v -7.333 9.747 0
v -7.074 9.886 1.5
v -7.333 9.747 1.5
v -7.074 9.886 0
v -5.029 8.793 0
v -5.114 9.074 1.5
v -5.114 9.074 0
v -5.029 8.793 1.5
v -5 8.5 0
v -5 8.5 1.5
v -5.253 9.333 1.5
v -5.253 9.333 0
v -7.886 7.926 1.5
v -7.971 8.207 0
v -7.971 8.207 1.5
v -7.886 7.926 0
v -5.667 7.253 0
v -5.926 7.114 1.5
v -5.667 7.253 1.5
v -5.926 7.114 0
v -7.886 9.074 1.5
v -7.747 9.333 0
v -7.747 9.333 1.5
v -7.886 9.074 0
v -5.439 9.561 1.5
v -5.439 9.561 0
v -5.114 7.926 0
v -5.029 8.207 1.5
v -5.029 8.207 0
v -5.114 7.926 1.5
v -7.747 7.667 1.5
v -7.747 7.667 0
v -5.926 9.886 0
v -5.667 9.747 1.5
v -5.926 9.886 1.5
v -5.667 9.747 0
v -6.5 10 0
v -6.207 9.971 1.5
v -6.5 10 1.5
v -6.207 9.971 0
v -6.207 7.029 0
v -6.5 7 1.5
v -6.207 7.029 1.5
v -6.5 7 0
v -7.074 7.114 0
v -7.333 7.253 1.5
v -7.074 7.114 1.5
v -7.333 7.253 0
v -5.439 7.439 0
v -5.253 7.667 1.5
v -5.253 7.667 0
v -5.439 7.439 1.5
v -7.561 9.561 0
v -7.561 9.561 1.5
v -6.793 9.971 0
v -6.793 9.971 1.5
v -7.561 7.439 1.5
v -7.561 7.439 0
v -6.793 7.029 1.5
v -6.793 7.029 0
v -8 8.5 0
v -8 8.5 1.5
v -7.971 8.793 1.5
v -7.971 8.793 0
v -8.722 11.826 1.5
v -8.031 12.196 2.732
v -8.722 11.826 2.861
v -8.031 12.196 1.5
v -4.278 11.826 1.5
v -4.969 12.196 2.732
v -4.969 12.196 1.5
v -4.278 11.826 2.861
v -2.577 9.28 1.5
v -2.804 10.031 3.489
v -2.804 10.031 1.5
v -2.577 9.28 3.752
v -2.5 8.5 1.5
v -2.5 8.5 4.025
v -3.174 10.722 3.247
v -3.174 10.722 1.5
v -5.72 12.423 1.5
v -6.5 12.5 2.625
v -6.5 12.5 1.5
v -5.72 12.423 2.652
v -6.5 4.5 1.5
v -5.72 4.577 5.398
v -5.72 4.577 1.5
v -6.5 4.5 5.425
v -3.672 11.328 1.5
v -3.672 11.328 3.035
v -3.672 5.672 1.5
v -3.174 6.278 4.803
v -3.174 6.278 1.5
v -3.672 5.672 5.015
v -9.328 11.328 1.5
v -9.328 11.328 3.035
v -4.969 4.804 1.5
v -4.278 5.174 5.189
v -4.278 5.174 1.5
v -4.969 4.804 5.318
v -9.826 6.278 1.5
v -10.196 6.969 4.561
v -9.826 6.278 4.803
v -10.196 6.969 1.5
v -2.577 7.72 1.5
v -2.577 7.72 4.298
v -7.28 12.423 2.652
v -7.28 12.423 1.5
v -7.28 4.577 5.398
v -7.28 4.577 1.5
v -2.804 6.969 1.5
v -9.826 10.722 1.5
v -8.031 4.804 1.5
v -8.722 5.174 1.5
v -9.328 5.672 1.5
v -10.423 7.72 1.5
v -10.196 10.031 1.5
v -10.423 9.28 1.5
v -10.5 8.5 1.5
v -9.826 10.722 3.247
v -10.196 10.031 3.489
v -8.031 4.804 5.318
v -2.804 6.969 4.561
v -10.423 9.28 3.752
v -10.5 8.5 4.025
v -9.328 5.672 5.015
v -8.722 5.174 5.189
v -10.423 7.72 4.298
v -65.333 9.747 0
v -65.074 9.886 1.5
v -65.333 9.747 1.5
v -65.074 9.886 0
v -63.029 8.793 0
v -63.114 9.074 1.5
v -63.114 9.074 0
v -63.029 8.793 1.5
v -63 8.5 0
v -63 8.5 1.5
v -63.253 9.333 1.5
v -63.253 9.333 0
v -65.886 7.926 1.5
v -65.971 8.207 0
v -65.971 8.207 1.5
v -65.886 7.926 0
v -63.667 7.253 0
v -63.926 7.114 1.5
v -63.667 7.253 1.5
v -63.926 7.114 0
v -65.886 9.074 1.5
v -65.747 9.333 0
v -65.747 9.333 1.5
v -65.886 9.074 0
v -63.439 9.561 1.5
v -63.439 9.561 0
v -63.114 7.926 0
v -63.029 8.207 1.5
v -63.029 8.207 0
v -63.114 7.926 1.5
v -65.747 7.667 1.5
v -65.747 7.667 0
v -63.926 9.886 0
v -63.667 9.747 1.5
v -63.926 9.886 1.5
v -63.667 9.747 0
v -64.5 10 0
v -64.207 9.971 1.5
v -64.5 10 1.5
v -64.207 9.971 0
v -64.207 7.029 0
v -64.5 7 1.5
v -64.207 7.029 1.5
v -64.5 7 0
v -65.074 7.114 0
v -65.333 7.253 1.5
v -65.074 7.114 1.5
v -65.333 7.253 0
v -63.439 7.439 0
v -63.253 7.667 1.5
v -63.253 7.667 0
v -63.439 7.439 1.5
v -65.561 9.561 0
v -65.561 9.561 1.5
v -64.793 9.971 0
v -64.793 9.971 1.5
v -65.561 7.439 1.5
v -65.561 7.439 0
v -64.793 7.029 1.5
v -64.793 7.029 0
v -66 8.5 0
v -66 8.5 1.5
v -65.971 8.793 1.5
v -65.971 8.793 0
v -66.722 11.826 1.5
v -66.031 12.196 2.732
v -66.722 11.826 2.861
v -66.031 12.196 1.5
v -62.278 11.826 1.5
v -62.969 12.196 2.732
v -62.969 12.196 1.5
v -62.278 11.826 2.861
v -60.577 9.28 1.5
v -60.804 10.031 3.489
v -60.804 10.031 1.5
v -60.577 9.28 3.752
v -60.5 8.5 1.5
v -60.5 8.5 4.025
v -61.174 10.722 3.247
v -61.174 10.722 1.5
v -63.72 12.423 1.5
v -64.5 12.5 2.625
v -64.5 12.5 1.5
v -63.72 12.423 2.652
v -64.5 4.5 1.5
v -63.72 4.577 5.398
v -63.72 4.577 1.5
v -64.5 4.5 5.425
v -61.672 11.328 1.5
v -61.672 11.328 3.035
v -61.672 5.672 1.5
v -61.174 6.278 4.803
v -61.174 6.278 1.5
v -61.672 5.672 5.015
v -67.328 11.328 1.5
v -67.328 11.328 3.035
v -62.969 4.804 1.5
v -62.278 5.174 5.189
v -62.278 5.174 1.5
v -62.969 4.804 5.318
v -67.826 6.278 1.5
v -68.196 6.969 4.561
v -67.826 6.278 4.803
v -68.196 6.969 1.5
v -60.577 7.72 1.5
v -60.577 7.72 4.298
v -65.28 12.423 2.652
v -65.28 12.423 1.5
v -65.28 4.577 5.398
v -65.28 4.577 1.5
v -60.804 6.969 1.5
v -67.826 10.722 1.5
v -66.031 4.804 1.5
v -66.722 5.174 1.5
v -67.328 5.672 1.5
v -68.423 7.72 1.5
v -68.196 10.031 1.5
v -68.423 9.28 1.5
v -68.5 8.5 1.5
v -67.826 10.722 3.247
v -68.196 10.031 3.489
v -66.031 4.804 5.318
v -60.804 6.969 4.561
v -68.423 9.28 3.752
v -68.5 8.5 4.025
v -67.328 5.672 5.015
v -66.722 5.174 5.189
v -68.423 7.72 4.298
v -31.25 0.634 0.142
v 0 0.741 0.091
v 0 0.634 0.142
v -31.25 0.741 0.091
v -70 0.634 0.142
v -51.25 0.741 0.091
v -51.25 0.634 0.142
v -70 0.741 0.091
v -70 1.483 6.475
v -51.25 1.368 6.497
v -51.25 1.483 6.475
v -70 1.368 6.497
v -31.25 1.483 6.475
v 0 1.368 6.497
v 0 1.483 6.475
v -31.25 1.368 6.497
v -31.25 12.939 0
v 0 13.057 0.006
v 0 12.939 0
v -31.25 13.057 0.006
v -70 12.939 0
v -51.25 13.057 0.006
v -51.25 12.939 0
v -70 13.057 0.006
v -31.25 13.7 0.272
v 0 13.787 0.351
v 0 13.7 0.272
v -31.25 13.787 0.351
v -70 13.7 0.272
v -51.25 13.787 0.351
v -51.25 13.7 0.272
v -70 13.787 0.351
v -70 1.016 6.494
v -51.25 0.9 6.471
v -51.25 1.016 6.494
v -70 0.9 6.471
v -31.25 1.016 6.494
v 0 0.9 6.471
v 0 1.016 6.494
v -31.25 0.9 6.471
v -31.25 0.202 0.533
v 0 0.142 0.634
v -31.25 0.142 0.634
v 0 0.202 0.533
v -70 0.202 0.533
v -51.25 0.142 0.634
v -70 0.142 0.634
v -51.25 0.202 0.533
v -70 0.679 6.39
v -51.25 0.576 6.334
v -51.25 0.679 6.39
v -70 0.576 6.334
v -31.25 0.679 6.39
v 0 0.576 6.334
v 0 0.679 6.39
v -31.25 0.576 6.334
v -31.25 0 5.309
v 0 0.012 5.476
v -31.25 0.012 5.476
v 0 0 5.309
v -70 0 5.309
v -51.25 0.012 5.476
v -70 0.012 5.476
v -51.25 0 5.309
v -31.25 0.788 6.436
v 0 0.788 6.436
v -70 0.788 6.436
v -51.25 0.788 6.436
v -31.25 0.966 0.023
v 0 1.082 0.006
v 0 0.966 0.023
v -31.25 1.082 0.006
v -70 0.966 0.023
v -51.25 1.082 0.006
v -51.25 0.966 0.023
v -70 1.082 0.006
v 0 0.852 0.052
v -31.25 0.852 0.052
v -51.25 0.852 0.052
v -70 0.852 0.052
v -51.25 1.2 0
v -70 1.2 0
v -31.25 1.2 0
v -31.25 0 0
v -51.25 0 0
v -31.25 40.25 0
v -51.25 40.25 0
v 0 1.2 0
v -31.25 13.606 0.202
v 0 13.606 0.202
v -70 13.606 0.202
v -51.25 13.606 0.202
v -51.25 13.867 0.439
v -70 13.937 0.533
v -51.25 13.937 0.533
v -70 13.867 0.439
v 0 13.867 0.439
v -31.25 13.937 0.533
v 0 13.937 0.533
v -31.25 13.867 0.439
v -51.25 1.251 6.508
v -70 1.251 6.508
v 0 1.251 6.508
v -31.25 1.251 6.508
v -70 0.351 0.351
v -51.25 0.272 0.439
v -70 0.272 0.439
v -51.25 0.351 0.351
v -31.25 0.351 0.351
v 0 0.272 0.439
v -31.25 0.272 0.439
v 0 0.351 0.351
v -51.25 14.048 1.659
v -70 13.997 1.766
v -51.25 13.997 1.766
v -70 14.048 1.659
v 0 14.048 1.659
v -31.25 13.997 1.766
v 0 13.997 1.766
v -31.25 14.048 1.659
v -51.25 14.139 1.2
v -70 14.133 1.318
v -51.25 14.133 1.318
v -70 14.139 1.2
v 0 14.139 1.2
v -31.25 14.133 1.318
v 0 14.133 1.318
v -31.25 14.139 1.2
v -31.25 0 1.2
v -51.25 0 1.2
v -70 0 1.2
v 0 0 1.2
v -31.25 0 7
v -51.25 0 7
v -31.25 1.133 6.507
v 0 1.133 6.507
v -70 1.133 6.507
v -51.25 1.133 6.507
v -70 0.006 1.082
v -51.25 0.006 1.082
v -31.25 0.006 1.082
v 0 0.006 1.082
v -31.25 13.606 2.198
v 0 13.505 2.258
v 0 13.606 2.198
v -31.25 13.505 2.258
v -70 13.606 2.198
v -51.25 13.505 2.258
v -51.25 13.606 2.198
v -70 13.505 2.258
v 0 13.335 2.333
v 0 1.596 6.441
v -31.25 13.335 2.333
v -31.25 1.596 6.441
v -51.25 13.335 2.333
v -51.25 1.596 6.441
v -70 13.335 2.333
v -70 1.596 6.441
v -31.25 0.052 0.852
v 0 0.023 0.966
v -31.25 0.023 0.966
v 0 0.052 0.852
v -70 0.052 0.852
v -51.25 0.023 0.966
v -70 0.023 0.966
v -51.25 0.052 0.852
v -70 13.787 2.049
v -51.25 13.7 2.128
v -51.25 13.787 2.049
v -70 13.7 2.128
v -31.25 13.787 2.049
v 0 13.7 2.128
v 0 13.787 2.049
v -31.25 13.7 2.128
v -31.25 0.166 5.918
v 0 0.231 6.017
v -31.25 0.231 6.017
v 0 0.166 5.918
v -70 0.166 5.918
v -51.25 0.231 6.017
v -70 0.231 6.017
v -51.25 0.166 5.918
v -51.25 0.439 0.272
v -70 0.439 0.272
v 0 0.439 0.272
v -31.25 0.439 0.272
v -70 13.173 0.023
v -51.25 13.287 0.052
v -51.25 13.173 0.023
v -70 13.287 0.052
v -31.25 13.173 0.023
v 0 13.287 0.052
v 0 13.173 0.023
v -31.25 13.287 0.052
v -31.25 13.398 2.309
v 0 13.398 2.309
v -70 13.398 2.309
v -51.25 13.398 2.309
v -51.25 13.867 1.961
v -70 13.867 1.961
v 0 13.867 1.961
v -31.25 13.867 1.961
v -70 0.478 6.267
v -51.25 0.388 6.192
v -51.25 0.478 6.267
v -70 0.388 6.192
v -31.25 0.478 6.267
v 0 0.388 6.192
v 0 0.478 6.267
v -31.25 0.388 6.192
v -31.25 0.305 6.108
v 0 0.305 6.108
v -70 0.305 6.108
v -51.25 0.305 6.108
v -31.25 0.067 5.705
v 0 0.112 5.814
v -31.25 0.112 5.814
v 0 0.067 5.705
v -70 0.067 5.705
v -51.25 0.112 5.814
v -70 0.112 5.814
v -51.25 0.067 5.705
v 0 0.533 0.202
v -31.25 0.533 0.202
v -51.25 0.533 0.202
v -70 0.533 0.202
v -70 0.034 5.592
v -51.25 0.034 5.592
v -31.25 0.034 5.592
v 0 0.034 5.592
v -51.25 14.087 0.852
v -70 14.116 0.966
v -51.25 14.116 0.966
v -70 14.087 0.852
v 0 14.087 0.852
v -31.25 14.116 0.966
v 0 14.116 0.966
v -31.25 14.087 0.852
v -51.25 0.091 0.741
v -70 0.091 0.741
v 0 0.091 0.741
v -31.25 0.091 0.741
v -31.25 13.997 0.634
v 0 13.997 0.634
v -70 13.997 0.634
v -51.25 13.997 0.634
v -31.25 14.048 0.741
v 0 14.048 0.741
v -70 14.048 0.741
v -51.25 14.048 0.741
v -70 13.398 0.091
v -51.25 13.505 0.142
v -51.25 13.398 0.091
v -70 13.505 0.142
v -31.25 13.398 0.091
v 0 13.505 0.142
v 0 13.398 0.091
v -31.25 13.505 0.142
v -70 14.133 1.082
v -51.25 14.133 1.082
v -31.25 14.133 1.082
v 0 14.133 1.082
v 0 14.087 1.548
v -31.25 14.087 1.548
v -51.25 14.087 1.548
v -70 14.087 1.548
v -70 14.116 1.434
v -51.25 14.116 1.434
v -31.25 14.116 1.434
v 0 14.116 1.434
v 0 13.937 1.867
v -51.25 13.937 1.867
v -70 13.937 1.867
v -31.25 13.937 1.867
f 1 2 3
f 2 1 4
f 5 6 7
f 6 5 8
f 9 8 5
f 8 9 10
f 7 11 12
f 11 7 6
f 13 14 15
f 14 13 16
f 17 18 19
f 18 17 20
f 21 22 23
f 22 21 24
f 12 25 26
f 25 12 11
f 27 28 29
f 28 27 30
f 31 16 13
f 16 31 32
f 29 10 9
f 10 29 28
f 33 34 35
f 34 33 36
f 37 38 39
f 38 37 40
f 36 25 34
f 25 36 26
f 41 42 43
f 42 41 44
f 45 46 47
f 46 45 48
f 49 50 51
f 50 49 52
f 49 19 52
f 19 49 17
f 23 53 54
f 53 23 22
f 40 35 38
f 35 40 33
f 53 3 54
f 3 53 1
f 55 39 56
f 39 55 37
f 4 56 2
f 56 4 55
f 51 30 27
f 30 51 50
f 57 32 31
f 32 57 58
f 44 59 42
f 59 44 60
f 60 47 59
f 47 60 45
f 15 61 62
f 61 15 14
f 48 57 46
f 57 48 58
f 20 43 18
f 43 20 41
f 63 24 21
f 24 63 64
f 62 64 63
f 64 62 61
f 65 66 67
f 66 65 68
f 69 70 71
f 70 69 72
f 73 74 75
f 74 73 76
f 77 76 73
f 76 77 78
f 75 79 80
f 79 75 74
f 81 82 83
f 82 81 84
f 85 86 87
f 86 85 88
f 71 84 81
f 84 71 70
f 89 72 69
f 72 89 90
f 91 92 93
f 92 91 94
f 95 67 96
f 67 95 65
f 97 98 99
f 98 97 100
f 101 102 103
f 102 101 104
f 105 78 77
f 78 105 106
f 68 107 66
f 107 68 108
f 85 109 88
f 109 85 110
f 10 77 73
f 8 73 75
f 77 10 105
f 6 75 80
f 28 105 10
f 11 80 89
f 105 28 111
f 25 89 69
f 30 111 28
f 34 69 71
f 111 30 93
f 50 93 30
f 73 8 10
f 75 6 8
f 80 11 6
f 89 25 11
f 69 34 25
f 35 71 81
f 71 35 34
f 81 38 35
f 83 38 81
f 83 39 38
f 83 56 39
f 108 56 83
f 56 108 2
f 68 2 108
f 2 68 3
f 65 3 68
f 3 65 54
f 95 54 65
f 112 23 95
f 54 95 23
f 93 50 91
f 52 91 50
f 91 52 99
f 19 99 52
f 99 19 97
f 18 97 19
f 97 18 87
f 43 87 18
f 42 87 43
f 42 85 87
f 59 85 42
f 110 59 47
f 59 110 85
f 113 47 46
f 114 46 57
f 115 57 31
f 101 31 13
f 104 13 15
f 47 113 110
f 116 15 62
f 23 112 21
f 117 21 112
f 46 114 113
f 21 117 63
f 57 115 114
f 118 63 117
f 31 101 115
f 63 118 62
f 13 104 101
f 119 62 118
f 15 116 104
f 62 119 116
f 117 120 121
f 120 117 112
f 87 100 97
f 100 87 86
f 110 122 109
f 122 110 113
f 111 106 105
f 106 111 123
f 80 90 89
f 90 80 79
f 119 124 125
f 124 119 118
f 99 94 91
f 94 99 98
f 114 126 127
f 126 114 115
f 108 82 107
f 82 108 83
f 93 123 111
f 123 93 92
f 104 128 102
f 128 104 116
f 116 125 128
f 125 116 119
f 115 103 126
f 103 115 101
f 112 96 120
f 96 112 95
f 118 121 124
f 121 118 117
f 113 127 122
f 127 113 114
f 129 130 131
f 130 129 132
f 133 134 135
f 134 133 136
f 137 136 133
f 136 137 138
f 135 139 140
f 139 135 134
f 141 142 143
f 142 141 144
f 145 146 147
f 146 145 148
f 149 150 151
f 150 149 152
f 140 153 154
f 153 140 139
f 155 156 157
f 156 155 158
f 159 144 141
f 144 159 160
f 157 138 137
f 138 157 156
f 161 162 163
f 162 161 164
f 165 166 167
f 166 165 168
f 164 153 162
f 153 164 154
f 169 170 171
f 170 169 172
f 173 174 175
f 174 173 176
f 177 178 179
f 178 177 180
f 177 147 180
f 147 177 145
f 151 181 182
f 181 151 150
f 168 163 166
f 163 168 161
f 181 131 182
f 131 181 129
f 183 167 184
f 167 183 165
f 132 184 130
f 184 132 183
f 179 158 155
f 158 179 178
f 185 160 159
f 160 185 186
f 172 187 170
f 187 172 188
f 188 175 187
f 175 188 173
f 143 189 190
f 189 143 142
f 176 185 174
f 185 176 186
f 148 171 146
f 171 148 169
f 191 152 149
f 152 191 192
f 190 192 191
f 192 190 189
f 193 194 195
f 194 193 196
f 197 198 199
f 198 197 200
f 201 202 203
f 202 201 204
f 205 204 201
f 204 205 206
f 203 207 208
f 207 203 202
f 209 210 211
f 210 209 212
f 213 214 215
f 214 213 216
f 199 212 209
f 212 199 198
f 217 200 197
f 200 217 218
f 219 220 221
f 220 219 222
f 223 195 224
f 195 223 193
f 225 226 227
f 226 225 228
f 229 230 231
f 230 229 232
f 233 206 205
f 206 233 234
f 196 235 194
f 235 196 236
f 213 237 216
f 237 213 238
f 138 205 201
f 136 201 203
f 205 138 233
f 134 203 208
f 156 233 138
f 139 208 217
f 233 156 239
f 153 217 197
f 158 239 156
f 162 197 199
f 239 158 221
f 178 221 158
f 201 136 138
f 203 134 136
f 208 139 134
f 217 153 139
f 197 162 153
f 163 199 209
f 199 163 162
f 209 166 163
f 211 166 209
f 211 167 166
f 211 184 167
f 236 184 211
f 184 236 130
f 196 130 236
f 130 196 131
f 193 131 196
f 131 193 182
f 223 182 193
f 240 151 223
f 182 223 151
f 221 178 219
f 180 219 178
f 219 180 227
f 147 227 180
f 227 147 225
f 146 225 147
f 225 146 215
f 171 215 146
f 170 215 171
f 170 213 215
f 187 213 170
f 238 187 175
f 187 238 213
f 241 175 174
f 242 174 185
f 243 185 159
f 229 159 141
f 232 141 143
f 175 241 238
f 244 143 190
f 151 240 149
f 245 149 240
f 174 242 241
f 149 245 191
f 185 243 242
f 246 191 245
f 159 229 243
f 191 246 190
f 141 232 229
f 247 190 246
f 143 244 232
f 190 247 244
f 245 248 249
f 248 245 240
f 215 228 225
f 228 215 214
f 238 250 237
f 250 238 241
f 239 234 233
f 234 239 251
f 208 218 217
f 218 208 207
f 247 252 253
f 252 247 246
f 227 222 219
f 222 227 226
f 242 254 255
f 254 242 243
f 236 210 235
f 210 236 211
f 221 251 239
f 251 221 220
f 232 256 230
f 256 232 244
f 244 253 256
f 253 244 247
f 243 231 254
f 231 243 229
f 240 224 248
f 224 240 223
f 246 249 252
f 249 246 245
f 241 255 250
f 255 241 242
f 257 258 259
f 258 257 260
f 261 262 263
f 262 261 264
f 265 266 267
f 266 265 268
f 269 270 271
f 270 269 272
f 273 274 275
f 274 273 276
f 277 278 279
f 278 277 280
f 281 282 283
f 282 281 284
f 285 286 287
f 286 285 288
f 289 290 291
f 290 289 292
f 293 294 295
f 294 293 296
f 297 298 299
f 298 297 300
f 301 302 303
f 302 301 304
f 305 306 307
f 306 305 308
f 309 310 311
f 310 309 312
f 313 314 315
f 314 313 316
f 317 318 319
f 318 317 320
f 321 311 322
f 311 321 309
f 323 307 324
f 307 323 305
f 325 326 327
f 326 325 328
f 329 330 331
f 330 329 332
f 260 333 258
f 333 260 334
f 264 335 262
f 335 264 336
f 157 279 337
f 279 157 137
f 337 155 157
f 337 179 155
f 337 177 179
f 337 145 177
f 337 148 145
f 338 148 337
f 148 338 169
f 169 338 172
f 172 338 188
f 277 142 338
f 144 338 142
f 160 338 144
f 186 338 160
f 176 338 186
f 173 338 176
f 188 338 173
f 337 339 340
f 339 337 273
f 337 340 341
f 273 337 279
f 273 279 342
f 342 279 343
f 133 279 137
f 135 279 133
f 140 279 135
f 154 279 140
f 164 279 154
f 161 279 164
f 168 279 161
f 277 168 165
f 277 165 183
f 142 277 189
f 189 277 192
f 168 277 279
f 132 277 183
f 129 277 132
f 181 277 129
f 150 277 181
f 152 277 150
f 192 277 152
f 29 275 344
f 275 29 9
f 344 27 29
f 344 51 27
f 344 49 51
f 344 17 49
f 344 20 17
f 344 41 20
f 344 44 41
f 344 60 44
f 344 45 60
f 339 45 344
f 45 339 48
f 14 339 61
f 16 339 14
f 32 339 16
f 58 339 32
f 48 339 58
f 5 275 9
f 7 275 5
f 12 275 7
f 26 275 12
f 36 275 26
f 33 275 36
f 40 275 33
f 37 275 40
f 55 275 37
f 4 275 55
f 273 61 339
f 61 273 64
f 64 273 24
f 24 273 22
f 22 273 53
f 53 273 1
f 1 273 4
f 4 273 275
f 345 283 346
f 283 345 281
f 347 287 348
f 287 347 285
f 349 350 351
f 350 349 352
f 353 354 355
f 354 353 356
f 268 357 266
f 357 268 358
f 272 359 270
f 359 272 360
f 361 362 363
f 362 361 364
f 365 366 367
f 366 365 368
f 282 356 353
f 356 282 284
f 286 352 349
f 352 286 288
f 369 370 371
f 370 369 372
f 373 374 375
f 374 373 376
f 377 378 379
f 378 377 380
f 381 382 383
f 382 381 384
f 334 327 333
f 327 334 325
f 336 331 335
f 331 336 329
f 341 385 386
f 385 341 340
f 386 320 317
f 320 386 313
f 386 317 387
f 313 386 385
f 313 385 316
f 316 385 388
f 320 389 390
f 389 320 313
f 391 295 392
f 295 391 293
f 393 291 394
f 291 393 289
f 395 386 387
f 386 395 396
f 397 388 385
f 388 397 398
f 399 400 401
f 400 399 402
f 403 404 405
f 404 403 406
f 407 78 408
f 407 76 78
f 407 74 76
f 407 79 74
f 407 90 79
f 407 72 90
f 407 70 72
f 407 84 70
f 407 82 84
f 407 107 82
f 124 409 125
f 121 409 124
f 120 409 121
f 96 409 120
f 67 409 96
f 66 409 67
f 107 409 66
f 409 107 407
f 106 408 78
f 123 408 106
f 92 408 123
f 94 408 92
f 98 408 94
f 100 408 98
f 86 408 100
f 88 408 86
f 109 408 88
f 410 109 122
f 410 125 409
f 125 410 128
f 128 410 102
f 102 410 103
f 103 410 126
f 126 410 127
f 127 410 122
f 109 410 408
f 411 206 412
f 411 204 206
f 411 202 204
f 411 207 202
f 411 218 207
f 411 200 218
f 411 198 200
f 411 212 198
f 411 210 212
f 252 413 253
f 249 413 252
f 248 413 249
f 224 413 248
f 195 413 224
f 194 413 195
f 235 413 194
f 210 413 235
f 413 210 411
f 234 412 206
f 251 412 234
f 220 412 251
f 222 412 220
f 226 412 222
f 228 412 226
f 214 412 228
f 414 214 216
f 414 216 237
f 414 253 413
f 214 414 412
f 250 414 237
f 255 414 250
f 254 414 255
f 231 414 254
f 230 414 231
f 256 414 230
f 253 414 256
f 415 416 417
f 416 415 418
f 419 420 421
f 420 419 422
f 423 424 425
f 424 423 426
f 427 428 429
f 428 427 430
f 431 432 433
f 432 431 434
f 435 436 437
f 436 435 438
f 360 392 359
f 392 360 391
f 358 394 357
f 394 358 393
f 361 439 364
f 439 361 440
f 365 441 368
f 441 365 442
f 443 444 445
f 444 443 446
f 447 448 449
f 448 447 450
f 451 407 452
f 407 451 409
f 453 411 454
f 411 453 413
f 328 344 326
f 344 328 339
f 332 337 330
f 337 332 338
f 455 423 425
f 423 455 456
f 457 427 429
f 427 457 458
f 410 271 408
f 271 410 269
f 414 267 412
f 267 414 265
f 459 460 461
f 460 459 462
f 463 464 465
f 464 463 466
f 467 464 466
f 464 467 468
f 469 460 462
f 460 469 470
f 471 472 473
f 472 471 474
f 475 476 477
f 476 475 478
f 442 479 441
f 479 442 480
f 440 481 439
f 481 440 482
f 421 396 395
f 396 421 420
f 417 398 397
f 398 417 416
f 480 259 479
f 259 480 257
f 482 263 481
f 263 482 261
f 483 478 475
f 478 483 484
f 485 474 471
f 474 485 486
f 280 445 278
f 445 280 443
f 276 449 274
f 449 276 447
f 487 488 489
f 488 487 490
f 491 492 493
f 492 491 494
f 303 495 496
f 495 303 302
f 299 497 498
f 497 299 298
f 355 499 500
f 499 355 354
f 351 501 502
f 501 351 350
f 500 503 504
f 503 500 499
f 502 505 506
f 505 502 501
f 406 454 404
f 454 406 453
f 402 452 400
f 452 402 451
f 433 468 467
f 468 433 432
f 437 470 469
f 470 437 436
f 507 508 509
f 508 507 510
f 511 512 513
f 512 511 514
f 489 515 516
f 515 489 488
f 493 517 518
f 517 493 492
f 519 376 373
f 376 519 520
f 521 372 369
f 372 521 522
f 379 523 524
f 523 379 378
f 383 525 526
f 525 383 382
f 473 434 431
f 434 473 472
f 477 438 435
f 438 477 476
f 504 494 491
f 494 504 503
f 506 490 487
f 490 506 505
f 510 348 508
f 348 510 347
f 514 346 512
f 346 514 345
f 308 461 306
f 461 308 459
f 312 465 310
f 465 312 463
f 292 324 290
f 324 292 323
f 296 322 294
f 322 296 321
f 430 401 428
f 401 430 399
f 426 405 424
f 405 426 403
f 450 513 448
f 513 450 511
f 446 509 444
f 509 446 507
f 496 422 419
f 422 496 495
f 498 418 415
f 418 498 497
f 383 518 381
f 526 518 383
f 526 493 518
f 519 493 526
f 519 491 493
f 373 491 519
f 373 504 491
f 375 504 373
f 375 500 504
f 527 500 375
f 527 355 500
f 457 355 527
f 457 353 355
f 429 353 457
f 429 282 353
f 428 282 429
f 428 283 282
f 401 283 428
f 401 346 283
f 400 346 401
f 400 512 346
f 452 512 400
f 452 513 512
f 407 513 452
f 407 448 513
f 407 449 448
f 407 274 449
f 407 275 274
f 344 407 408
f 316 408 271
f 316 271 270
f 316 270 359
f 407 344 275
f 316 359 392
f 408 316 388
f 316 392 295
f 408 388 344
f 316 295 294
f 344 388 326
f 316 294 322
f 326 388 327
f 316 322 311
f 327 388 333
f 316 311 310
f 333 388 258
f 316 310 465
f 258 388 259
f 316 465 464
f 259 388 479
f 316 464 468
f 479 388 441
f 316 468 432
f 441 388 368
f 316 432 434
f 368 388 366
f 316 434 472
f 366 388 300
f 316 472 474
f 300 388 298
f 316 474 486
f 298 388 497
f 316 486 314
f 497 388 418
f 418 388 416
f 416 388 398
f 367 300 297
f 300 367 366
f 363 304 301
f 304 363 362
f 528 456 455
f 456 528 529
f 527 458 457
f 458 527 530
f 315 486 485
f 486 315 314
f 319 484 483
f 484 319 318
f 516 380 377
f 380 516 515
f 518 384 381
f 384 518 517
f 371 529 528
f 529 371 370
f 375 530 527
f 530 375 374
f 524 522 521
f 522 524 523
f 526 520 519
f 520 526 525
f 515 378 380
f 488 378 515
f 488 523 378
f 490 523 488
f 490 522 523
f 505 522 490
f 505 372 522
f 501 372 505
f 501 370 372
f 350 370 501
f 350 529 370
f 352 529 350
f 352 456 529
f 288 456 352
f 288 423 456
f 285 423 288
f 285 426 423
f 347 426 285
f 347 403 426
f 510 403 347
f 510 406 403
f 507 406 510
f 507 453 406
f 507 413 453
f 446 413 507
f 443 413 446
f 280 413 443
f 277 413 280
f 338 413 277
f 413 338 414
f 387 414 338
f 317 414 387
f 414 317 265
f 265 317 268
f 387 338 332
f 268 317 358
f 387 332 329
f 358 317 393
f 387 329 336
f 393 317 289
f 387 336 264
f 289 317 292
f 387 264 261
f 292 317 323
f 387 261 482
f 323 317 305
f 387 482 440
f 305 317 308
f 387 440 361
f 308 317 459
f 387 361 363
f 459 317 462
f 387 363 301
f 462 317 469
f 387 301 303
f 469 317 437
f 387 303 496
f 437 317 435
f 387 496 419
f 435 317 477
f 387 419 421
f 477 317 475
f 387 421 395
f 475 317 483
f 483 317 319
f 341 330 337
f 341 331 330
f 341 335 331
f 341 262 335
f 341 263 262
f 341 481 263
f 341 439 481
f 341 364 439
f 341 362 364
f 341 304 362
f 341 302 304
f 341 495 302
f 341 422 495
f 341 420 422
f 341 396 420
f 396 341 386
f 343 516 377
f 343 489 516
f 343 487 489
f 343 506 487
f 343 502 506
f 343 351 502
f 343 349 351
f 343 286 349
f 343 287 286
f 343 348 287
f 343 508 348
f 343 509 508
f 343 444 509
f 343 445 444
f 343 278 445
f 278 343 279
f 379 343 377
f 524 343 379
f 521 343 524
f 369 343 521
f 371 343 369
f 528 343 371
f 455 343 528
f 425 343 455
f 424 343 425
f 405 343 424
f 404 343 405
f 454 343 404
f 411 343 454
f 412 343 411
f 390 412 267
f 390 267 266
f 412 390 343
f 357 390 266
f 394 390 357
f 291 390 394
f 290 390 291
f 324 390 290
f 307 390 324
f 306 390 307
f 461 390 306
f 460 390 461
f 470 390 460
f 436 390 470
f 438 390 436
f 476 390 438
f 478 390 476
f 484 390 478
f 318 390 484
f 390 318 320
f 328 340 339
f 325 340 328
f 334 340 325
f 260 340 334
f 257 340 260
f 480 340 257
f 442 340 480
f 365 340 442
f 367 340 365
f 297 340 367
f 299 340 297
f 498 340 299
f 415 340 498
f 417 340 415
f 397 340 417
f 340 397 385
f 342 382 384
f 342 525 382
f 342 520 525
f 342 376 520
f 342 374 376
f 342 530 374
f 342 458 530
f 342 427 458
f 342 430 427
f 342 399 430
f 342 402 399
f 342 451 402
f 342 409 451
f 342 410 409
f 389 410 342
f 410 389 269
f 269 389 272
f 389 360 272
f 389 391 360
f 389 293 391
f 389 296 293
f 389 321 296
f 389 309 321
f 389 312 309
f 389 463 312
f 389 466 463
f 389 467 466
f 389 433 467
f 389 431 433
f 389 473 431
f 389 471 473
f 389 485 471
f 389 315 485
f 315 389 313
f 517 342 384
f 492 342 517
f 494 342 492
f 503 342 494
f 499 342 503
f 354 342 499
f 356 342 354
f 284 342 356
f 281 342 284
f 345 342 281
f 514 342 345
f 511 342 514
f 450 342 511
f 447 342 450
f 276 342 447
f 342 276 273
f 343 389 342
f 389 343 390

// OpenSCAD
// file: parts/screw_cutout.scad
/*
 * Nomad Core - Screw Cutout Module
 * M2.5 screw hole with hex nut recess access from bottom
 * 
 * Screw specs: M2.5 threading, 16mm long, TR8 hex head
 */

// ============================================
// SCREW CUTOUT CONFIGURATION
// ============================================
// All screw cutout settings:
// - Shaft diameter and height
// - Nut recess dimensions and positioning

// ============================================
// SCREW SPECIFICATIONS
// ============================================
screw_shaft_diameter = 3.0;   // Clearance for M2.5 screw (mm)
screw_shaft_height = 25.0;    // Full height to pass through (mm)
nut_recess_diameter = 8.0;    // Hex nut pocket diameter (mm)
nut_recess_height = 6.0;      // Hex nut pocket depth (mm)
nut_recess_offset = 4.5;      // Start position from bottom (mm)

// ============================================
// RENDER QUALITY
// ============================================
$fn = 32;

// ============================================
// SCREW CUTOUT MODULE
// ============================================
// Creates M2.5 screw hole with hex nut recess accessible from bottom
//
// Parameters: None (uses global specifications above)
//
// Usage: difference() { your_part(); translate([x,y,z]) screw_cutout(); }

module screw_cutout() {
    union() {
        // Screw shaft hole - full height to allow screw to pass through
        cylinder(h=screw_shaft_height, d=screw_shaft_diameter, center=false);
        
        // Hex nut recess - starts offset from bottom to create nut pocket
        translate([0, 0, nut_recess_offset])
            cylinder(h=nut_recess_height, d=nut_recess_diameter, center=false);
    }
}

// ============================================
// TEST RENDER (uncomment for visualization)
// ============================================
// screw_cutout();
//
// // Show reference cube to see the cutout in context
// %translate([0, 0, 5])
//     cube([15, 15, 5], center=true);
// file: brain_mount_slim.scad
/*
 * Nomad Core - Brain Mount Bracket
 * Mounting bracket for compute module (Raspberry Pi or compatible)
 * 
 * Single wedge-shaped bracket with M2.5 screw holes for secure mounting
 * Designed to attach to left side of main baseplate
 */

// ============================================
// IMPORTS
// ============================================
use <parts/screw_cutout.scad>

// ============================================
// BRAIN MOUNT CONFIGURATION
// ============================================
// All brain mount settings consolidated here for easy adjustment:
// - Wedge dimensions
// - Screw hole positions (matching Pi 3B+ pattern)
// - Component positioning

// ============================================
// WEDGE 1 DIMENSIONS (Long wedge with screw holes)
// ============================================
wedge1_size = [20.0, 70.0, 7.0];  // [Width, Length, Height] (mm)
nose_round_radius = 1.2;          // Radius to soften wedge nose/corners (mm)

// ============================================
// SCREW HOLE POSITIONS
// ============================================
// Hole positions on Wedge 1 match Pi 3B+ mounting pattern
hole1_offset = [6.5, 8.5];   // [Long edge, Short edge] distance (mm)
pi_length_spacing = 58.0;    // Standard Pi mounting spacing (mm)
hole2_offset = [hole1_offset[0] + pi_length_spacing, hole1_offset[1]];  // [64.5, 8.5] (mm)
screw_depth = -3.0;          // Inset from wedge surface (mm)

// ============================================
// RENDER QUALITY
// ============================================
$fn = 64;

// ============================================
// RIGHT ANGLE WEDGE MODULE
// ============================================
// Creates a right-angle triangular prism
//
// Parameters:
// - width: Triangle-to-triangle dimension (mm)
// - length: Back wall to nose dimension (mm)
// - height: Tall dimension (mm)

module wedge(width, length, height) {
    // Rotate to proper orientation for mounting
    rotate([0, 0, 90])
    rotate([90, 0, 0])
    translate([0, 0, -length])
    linear_extrude(height=length)
        offset(r=nose_round_radius)
        offset(delta=-nose_round_radius)
            polygon([
                [0, 0],        // Origin
                [width, 0],    // Right edge
                [0, height]    // Top corner
            ]);
}

// ============================================
// WEDGE 1 WITH SCREW HOLES
// ============================================
// Long wedge with two M2.5 screw holes matching Pi mounting pattern

module wedge1_with_holes() {
    difference() {
        // Main wedge body
        wedge(wedge1_size[0], wedge1_size[1], wedge1_size[2]);
        
        // First screw hole
        translate([-hole1_offset[0], hole1_offset[1], screw_depth])
            screw_cutout();
        
        // Second screw hole (Pi lengthwise spacing)
        translate([-hole2_offset[0], hole2_offset[1], screw_depth])
            screw_cutout();
    }
}

// ============================================
// COMPLETE BRAIN MOUNT ASSEMBLY
// ============================================
module brain_mount() {
    union() {
        // Wedge 1 (long wedge with screw holes)
        wedge1_with_holes();
    }
}

// ============================================
// MAIN RENDER
// ============================================
brain_mount();
// main file
/*
 * Nomad Core - Brain Mount Bracket
 * Mounting bracket for compute module (Raspberry Pi or compatible)
 * 
 * Two wedge-shaped brackets with M2.5 screw holes for secure mounting
 * Designed to attach to left side of main baseplate
 */

// ============================================
// IMPORTS
// ============================================
use <brain_mount_slim.scad>

// ============================================
// BRAIN MOUNT CONFIGURATION
// ============================================
// All brain mount settings consolidated here for easy adjustment:
// - Wedge 2 dimensions
// - Component positioning

// ============================================
// WEDGE 2 DIMENSIONS (Front wedge)
// ============================================
wedge2_size = [40.25, 20.0, 7.0];  // [Width, Length, Height] (mm)
wedge2_pos = [-31.25, 0, 0];       // [X, Y, Z] position offset (mm)

// ============================================
// RENDER QUALITY
// ============================================
$fn = 64;

// ============================================
// RIGHT ANGLE WEDGE MODULE
// ============================================
// Creates a right-angle triangular prism
//
// Parameters:
// - width: Triangle-to-triangle dimension (mm)
// - length: Back wall to nose dimension (mm)
// - height: Tall dimension (mm)

module wedge(width, length, height) {
    // Rotate to proper orientation for mounting
    rotate([0, 0, 90])
    rotate([90, 0, 0])
    translate([0, 0, -length])
    linear_extrude(height=length)
        polygon([
            [0, 0],        // Origin
            [width, 0],    // Right edge
            [0, height]    // Top corner
        ]);
}

// ============================================
// WEDGE 2 BODY
// ============================================
// Front wedge without screw holes

module wedge2_body() {
    wedge(wedge2_size[0], wedge2_size[1], wedge2_size[2]);
}

// ============================================
// COMPLETE BRAIN MOUNT ASSEMBLY
// ============================================
module brain_mount() {
    union() {
        // Wedge 1 from slim model (same origin/placement)
        wedge1_with_holes();
        
        // Wedge 2 (positioned between screw holes)
        translate(wedge2_pos)
            wedge2_body();
    }
}

// ============================================
// MAIN RENDER
// ============================================
brain_mount();
